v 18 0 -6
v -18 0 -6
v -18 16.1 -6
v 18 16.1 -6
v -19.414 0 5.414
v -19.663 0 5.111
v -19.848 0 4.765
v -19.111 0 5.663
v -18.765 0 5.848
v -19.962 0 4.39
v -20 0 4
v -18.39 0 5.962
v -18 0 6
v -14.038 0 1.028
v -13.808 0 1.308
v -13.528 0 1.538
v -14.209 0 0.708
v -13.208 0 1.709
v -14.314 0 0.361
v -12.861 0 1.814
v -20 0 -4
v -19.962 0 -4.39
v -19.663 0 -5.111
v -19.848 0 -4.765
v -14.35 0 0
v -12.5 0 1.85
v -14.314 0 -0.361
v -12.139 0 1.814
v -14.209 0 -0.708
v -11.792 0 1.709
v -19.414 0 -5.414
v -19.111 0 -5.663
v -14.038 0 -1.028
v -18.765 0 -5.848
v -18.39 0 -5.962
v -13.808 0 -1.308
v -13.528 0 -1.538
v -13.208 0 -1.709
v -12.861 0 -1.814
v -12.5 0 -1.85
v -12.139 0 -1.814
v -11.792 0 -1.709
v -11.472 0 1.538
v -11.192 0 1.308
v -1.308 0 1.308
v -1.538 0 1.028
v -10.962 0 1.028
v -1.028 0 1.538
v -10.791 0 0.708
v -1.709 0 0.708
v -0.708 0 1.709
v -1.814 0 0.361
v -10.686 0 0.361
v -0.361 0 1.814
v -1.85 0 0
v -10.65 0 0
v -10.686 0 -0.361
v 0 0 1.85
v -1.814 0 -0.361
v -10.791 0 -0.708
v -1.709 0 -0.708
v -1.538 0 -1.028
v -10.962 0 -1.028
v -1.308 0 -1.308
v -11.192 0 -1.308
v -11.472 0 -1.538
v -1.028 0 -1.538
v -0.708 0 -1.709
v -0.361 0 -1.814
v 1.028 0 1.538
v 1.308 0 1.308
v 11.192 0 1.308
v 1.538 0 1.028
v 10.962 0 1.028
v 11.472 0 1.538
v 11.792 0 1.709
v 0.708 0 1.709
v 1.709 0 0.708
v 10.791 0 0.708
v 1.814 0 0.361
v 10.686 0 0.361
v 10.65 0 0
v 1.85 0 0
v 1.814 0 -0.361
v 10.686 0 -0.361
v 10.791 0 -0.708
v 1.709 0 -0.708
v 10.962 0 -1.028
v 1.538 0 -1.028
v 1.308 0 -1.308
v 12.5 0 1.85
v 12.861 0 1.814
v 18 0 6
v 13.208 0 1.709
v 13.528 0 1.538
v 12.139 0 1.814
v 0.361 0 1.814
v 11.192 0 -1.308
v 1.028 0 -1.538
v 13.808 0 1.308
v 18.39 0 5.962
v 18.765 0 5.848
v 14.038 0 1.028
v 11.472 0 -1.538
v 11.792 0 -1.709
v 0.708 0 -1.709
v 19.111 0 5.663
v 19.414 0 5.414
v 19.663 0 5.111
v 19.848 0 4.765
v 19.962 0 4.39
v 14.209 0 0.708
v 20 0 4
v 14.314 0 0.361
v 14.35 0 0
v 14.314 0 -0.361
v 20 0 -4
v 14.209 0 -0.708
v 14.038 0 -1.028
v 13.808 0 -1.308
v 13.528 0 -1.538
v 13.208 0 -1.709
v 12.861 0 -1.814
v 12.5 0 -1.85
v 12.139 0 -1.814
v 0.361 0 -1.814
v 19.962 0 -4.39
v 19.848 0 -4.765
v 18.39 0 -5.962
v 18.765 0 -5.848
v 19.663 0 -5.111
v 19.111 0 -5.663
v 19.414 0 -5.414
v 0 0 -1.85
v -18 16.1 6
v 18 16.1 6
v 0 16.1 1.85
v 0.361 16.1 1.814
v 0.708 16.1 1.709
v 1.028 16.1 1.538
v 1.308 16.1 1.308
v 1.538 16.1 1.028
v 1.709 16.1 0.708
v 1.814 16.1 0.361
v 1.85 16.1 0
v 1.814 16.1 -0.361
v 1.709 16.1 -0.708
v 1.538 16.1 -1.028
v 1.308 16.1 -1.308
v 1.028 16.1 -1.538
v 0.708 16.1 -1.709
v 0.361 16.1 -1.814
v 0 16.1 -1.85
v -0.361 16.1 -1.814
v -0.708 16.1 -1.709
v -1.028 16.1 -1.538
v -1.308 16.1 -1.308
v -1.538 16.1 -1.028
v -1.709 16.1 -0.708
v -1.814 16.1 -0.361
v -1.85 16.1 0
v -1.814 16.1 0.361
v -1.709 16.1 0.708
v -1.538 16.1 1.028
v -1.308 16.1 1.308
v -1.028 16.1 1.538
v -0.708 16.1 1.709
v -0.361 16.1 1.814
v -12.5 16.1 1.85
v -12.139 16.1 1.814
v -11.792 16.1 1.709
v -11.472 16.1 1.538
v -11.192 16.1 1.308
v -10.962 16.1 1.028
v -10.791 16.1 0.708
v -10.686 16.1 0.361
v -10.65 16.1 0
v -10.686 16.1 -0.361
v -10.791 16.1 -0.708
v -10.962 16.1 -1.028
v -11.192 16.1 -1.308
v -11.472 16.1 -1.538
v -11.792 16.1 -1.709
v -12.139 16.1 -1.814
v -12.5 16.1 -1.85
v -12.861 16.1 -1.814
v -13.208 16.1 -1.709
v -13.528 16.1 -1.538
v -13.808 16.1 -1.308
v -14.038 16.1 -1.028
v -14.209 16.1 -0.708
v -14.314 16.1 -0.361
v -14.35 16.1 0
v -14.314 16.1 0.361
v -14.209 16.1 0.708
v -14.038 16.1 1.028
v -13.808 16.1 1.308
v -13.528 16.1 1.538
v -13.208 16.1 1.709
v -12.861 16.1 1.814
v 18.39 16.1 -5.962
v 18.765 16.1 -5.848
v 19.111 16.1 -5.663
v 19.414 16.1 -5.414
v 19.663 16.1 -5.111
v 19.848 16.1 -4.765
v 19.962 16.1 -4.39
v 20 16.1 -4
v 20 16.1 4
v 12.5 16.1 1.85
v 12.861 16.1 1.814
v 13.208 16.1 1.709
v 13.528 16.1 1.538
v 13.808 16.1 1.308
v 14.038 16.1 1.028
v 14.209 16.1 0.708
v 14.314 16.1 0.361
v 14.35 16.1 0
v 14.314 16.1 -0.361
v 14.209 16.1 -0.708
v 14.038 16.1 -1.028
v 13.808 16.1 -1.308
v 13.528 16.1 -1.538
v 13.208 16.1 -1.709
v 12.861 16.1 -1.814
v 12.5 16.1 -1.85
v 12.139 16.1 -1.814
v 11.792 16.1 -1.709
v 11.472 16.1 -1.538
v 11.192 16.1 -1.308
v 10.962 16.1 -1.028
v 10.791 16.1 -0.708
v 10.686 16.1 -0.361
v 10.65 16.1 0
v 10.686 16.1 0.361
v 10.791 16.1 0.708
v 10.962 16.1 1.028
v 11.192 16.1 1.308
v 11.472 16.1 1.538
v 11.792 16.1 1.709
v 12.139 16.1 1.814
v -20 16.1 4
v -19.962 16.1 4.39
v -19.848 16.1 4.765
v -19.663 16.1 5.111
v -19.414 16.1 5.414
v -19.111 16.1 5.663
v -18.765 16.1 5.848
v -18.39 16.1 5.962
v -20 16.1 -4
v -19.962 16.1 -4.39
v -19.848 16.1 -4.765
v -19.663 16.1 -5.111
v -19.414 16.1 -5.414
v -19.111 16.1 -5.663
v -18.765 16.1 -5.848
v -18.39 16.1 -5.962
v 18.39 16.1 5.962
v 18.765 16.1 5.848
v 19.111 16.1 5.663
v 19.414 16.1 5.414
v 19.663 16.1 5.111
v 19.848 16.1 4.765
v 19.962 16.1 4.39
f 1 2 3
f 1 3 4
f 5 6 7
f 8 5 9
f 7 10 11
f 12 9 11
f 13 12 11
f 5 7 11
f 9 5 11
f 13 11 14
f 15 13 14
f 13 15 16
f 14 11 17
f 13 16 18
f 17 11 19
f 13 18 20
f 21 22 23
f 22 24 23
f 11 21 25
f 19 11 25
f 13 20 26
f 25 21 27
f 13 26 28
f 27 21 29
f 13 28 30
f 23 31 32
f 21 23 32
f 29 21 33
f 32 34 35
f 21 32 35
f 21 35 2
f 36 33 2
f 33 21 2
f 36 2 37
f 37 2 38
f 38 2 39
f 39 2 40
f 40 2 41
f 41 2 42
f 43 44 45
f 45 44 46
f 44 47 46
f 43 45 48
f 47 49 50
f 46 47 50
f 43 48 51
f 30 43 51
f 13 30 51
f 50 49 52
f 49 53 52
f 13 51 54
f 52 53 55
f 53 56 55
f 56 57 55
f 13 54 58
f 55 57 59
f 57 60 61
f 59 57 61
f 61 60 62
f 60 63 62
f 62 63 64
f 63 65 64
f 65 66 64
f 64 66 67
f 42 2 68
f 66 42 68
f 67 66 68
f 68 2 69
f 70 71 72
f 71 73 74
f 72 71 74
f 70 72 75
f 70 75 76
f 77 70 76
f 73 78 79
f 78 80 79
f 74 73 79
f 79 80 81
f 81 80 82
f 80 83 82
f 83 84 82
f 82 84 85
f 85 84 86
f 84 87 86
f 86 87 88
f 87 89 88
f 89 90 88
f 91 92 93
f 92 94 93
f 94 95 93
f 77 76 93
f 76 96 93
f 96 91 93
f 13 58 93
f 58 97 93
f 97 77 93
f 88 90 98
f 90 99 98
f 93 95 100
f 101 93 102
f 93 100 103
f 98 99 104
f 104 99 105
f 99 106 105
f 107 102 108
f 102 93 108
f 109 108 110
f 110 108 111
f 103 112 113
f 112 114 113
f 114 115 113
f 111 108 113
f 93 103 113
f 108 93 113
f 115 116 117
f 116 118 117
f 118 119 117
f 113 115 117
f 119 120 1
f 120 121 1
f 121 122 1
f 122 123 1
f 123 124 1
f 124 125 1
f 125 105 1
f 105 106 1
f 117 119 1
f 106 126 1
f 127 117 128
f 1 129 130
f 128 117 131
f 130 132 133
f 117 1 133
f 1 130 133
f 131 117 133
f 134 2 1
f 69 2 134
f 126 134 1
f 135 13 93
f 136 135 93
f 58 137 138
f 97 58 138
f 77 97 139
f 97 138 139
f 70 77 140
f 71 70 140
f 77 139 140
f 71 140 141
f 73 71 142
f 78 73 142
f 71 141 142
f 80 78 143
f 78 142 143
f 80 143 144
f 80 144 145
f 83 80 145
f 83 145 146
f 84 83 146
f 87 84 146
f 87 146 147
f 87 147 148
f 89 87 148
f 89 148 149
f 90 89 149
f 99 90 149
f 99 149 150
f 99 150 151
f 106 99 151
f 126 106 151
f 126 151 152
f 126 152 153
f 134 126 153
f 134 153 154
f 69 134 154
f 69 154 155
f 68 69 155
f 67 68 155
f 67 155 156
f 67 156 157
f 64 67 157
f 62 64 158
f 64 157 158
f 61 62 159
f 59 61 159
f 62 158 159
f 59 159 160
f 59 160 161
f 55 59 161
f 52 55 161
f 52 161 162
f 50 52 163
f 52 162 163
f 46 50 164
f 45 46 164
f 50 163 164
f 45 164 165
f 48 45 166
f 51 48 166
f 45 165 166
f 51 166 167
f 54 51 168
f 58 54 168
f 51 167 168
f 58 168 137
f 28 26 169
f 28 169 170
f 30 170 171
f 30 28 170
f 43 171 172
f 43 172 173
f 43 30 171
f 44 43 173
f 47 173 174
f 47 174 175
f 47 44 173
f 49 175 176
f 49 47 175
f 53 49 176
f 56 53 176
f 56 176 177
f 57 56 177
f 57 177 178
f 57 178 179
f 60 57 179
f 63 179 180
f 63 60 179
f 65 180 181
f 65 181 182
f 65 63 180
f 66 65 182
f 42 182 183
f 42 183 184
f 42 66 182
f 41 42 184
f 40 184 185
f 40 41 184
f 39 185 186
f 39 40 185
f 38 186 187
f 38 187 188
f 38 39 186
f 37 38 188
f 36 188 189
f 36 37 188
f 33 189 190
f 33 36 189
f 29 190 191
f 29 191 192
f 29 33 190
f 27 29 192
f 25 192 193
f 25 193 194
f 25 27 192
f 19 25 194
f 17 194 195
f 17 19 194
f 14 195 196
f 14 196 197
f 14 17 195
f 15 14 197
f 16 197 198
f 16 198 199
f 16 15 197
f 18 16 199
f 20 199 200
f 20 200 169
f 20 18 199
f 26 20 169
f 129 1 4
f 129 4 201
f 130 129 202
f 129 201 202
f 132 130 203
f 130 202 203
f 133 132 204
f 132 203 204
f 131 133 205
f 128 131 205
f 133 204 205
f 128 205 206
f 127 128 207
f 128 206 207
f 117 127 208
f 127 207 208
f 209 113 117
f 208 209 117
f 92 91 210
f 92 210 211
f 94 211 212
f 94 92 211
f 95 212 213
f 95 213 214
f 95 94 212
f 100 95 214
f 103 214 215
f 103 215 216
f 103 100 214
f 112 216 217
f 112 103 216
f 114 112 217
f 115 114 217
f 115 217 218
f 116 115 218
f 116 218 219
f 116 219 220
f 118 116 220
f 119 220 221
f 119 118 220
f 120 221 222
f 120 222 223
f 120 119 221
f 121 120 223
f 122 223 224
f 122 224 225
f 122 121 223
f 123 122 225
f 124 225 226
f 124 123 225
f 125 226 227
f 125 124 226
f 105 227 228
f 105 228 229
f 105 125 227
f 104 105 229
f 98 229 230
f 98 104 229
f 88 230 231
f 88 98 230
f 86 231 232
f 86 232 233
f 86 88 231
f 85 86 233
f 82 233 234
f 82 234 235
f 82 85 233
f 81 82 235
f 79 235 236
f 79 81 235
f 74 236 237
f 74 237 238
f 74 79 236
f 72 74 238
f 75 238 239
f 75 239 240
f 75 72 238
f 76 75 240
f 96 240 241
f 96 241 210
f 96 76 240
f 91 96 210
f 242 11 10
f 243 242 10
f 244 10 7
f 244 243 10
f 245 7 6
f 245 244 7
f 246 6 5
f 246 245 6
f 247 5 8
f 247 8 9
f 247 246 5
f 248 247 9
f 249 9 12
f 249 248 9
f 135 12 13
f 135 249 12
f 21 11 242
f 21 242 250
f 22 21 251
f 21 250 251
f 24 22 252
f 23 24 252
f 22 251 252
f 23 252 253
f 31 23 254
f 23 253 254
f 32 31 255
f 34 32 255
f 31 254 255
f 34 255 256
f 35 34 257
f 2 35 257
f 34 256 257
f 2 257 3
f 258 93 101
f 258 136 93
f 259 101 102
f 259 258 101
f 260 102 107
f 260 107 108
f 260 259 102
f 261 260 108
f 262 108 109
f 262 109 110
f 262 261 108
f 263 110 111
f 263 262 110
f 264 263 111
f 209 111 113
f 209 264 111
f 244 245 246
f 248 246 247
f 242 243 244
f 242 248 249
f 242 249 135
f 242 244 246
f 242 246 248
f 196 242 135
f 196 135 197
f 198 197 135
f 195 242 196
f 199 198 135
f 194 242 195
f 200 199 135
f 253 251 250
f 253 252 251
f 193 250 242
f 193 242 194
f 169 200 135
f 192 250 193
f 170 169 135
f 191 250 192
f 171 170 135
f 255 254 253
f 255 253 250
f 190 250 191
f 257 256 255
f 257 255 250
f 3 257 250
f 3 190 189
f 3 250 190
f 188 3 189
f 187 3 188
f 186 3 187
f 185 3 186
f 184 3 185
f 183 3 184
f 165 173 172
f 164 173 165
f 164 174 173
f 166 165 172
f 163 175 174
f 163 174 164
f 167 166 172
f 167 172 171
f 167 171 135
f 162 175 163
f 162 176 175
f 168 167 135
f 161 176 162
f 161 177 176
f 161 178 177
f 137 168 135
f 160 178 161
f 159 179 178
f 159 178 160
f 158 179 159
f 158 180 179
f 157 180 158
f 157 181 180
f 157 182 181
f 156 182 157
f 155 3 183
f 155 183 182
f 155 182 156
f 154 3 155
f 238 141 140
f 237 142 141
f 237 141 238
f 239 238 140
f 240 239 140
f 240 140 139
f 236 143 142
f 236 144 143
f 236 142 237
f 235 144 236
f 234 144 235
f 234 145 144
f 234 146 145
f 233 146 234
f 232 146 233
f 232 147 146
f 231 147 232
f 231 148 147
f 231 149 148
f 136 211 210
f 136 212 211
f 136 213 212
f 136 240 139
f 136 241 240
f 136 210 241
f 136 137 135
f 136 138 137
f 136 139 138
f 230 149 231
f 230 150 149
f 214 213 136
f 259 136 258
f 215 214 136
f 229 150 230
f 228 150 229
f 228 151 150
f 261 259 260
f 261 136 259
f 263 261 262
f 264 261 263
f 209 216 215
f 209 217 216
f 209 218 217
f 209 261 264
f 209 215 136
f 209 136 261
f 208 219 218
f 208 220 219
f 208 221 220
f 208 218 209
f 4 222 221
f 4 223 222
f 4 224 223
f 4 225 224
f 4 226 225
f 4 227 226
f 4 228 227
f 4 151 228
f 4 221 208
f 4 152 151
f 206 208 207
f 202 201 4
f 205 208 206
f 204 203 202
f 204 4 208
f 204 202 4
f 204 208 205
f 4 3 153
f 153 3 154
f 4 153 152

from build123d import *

# Parameters (mm, degrees)
SKETCH_1_W          = 40
SKETCH_1_H          = 12
SKETCH_1_R          = 1.85
EXTRUDE_1_DEPTH     = 16.1
FILLET_1_R          = 2
SKETCH_2_R          = 1.85
CUT_EXTRUDE_1_DEPTH = 20


with BuildPart() as part:
    # 草图1 → 凸台-拉伸1 (new body)
    with BuildSketch(Plane(origin=(0, 0, 0), x_dir=(1, 0, 0), z_dir=(0, 1, 0))):
        Rectangle(SKETCH_1_W, SKETCH_1_H)
        with Locations(Location((-12.5, 0, 0), (0, 0, 270))):
            Circle(SKETCH_1_R, mode=Mode.SUBTRACT)
        with Locations(Location((12.5, 0, 0), (0, 0, 270))):
            Circle(SKETCH_1_R, mode=Mode.SUBTRACT)
    extrude(amount=EXTRUDE_1_DEPTH)

    # 圆角1
    fillet_1_edges = [part.edges().sort_by_distance(p)[0] for p in [
        (20, 8.05, 6),
        (-20, 8.05, 6),
        (-20, 8.05, -6),
        (20, 8.05, -6),
    ]]
    fillet(fillet_1_edges, radius=FILLET_1_R)

    # 草图2 → 切除-拉伸1 (cut)
    with BuildSketch(Plane(origin=(0, 16.1, 0), x_dir=(1, 0, 0), z_dir=(0, 1, 0))):
        with Locations(Location((0, 0, 0), (0, 0, 270))):
            Circle(SKETCH_2_R)
    extrude(amount=-CUT_EXTRUDE_1_DEPTH, mode=Mode.SUBTRACT)


solid = part.part
